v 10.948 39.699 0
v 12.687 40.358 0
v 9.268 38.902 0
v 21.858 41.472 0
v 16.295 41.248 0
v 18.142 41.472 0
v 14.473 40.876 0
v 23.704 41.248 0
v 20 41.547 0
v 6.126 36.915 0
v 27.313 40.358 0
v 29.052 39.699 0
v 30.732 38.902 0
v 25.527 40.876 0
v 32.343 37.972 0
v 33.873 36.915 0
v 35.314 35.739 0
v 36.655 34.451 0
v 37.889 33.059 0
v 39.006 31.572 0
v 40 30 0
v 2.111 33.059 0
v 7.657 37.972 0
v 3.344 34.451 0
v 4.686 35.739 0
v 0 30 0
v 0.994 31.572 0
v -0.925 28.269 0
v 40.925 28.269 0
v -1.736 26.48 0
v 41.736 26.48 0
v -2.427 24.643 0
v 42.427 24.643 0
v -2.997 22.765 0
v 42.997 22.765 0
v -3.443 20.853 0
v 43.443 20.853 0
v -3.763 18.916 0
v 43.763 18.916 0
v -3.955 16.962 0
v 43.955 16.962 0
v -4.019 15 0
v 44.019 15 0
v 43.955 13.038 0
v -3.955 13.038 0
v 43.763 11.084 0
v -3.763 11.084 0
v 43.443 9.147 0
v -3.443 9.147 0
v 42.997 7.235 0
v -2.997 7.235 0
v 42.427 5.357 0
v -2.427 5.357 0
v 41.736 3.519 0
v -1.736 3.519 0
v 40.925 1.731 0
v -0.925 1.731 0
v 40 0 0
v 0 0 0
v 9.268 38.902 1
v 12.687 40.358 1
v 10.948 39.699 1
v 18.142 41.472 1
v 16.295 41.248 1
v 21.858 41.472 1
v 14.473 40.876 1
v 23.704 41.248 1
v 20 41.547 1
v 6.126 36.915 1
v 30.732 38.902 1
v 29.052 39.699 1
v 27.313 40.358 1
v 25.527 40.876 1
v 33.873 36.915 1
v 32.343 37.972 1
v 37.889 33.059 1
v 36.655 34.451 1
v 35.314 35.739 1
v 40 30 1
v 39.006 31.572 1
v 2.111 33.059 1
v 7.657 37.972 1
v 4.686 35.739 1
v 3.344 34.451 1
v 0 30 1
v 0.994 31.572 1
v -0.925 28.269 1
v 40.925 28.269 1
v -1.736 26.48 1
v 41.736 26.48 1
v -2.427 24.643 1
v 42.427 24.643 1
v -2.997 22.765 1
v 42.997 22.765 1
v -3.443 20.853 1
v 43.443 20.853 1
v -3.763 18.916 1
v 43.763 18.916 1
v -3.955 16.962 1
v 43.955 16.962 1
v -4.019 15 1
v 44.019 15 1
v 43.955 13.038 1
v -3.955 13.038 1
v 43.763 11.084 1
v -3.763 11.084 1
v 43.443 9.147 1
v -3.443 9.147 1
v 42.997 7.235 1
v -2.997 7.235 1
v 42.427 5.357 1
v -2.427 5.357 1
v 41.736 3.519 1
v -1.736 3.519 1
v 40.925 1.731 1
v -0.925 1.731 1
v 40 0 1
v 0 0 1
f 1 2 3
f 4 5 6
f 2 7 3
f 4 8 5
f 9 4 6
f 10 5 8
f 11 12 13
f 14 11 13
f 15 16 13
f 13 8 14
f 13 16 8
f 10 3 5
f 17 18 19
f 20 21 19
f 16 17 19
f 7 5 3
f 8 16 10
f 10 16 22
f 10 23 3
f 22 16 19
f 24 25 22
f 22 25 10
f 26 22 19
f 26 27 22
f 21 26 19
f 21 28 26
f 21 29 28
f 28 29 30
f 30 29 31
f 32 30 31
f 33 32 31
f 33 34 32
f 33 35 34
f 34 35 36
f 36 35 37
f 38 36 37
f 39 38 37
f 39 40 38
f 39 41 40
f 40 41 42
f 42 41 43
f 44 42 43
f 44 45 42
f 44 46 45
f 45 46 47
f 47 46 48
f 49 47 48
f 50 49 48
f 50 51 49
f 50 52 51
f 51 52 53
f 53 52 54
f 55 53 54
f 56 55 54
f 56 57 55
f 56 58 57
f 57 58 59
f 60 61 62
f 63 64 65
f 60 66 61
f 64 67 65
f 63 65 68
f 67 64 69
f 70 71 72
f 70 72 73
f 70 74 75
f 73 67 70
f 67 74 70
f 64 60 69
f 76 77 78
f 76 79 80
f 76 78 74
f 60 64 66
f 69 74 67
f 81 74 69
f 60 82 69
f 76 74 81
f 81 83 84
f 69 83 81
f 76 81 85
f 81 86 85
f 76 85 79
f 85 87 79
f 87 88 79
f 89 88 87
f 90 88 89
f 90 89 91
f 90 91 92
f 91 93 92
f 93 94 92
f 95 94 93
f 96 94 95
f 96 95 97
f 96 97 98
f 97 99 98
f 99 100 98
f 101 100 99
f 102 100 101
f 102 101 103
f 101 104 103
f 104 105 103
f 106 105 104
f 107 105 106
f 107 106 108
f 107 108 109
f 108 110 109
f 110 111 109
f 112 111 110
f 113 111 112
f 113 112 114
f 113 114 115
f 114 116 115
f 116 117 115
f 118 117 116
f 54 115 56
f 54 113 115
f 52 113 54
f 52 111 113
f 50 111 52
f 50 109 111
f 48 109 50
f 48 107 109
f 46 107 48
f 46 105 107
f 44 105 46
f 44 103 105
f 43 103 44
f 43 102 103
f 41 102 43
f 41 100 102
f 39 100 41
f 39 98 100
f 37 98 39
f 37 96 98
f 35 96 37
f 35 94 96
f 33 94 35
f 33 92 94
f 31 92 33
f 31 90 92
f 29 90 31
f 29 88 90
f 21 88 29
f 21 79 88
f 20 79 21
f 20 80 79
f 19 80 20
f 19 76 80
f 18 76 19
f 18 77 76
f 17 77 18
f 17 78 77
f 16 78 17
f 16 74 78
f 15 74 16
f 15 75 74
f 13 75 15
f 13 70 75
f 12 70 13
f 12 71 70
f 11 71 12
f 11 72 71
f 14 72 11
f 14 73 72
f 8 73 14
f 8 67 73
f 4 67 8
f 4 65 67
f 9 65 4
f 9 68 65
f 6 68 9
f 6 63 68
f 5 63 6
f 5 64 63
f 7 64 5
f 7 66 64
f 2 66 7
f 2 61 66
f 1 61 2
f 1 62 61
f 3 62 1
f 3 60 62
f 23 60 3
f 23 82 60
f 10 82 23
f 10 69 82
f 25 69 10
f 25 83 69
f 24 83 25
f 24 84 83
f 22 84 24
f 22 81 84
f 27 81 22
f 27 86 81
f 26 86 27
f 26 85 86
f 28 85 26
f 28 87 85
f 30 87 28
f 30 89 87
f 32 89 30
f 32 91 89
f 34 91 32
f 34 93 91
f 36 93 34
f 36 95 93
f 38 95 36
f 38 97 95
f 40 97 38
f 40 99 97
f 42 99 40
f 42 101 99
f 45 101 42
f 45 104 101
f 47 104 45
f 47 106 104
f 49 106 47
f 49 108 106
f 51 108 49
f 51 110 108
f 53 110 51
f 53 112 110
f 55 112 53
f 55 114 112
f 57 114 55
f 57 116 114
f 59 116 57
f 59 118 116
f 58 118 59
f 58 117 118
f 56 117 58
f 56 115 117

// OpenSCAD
// Generated by Parametrix
ca_myPartO_face1_000 = [ [ 0.0000, 0.0000 ],[ 40.0000, 0.0000 ],[ 40.9254, 1.7313 ],[ 41.7356, 3.5195 ],[ 42.4271, 5.3568 ],[ 42.9970, 7.2354 ],[ 43.4428, 9.1473 ],[ 43.7626, 11.0842 ],[ 43.9550, 13.0379 ],[ 44.0192, 15.0000 ],[ 43.9550, 16.9621 ],[ 43.7626, 18.9158 ],[ 43.4428, 20.8527 ],[ 42.9970, 22.7646 ],[ 42.4271, 24.6432 ],[ 41.7356, 26.4805 ],[ 40.9254, 28.2687 ],[ 40.0000, 30.0000 ],[ 39.0060, 31.5719 ],[ 37.8887, 33.0587 ],[ 36.6555, 34.4508 ],[ 35.3142, 35.7391 ],[ 33.8735, 36.9153 ],[ 32.3430, 37.9718 ],[ 30.7323, 38.9017 ],[ 29.0521, 39.6990 ],[ 27.3131, 40.3585 ],[ 25.5268, 40.8759 ],[ 23.7045, 41.2479 ],[ 21.8583, 41.4721 ],[ 20.0000, 41.5470 ],[ 18.1417, 41.4721 ],[ 16.2955, 41.2479 ],[ 14.4732, 40.8759 ],[ 12.6869, 40.3585 ],[ 10.9479, 39.6990 ],[ 9.2677, 38.9017 ],[ 7.6570, 37.9718 ],[ 6.1265, 36.9153 ],[ 4.6858, 35.7391 ],[ 3.3445, 34.4508 ],[ 2.1113, 33.0587 ],[ 0.9940, 31.5719 ],[ 0.0000, 30.0000 ],[ -0.9254, 28.2687 ],[ -1.7356, 26.4805 ],[ -2.4271, 24.6432 ],[ -2.9970, 22.7646 ],[ -3.4428, 20.8527 ],[ -3.7626, 18.9158 ],[ -3.9550, 16.9621 ],[ -4.0192, 15.0000 ],[ -3.9550, 13.0379 ],[ -3.7626, 11.0842 ],[ -3.4428, 9.1473 ],[ -2.9970, 7.2354 ],[ -2.4271, 5.3568 ],[ -1.7356, 3.5195 ],[ -0.9254, 1.7313 ],[ -0.0000, 0.0000 ] ];
cb_myPartO_face1_000 = [  0, 1, 2, 3, 4, 5, 6, 7, 8, 9, 10, 11, 12, 13, 14, 15, 16, 17, 18, 19, 20, 21, 22, 23, 24, 25, 26, 27, 28, 29, 30, 31, 32, 33, 34, 35, 36, 37, 38, 39, 40, 41, 42, 43, 44, 45, 46, 47, 48, 49, 50, 51, 52, 53, 54, 55, 56, 57, 58, 59 ];
a_myPartO_face1 = concat(ca_myPartO_face1_000);
b_myPartO_face1 = [cb_myPartO_face1_000];

module subpax_myPartO () {
	translate( [ 0, 0, 0 ])
		rotate( [ 0, 0, 0 ])
			   linear_extrude(height = 1) polygon(a_myPartO_face1, b_myPartO_face1);
}

module pax_myPartO () {
	subpax_myPartO();
}

pax_myPartO();
